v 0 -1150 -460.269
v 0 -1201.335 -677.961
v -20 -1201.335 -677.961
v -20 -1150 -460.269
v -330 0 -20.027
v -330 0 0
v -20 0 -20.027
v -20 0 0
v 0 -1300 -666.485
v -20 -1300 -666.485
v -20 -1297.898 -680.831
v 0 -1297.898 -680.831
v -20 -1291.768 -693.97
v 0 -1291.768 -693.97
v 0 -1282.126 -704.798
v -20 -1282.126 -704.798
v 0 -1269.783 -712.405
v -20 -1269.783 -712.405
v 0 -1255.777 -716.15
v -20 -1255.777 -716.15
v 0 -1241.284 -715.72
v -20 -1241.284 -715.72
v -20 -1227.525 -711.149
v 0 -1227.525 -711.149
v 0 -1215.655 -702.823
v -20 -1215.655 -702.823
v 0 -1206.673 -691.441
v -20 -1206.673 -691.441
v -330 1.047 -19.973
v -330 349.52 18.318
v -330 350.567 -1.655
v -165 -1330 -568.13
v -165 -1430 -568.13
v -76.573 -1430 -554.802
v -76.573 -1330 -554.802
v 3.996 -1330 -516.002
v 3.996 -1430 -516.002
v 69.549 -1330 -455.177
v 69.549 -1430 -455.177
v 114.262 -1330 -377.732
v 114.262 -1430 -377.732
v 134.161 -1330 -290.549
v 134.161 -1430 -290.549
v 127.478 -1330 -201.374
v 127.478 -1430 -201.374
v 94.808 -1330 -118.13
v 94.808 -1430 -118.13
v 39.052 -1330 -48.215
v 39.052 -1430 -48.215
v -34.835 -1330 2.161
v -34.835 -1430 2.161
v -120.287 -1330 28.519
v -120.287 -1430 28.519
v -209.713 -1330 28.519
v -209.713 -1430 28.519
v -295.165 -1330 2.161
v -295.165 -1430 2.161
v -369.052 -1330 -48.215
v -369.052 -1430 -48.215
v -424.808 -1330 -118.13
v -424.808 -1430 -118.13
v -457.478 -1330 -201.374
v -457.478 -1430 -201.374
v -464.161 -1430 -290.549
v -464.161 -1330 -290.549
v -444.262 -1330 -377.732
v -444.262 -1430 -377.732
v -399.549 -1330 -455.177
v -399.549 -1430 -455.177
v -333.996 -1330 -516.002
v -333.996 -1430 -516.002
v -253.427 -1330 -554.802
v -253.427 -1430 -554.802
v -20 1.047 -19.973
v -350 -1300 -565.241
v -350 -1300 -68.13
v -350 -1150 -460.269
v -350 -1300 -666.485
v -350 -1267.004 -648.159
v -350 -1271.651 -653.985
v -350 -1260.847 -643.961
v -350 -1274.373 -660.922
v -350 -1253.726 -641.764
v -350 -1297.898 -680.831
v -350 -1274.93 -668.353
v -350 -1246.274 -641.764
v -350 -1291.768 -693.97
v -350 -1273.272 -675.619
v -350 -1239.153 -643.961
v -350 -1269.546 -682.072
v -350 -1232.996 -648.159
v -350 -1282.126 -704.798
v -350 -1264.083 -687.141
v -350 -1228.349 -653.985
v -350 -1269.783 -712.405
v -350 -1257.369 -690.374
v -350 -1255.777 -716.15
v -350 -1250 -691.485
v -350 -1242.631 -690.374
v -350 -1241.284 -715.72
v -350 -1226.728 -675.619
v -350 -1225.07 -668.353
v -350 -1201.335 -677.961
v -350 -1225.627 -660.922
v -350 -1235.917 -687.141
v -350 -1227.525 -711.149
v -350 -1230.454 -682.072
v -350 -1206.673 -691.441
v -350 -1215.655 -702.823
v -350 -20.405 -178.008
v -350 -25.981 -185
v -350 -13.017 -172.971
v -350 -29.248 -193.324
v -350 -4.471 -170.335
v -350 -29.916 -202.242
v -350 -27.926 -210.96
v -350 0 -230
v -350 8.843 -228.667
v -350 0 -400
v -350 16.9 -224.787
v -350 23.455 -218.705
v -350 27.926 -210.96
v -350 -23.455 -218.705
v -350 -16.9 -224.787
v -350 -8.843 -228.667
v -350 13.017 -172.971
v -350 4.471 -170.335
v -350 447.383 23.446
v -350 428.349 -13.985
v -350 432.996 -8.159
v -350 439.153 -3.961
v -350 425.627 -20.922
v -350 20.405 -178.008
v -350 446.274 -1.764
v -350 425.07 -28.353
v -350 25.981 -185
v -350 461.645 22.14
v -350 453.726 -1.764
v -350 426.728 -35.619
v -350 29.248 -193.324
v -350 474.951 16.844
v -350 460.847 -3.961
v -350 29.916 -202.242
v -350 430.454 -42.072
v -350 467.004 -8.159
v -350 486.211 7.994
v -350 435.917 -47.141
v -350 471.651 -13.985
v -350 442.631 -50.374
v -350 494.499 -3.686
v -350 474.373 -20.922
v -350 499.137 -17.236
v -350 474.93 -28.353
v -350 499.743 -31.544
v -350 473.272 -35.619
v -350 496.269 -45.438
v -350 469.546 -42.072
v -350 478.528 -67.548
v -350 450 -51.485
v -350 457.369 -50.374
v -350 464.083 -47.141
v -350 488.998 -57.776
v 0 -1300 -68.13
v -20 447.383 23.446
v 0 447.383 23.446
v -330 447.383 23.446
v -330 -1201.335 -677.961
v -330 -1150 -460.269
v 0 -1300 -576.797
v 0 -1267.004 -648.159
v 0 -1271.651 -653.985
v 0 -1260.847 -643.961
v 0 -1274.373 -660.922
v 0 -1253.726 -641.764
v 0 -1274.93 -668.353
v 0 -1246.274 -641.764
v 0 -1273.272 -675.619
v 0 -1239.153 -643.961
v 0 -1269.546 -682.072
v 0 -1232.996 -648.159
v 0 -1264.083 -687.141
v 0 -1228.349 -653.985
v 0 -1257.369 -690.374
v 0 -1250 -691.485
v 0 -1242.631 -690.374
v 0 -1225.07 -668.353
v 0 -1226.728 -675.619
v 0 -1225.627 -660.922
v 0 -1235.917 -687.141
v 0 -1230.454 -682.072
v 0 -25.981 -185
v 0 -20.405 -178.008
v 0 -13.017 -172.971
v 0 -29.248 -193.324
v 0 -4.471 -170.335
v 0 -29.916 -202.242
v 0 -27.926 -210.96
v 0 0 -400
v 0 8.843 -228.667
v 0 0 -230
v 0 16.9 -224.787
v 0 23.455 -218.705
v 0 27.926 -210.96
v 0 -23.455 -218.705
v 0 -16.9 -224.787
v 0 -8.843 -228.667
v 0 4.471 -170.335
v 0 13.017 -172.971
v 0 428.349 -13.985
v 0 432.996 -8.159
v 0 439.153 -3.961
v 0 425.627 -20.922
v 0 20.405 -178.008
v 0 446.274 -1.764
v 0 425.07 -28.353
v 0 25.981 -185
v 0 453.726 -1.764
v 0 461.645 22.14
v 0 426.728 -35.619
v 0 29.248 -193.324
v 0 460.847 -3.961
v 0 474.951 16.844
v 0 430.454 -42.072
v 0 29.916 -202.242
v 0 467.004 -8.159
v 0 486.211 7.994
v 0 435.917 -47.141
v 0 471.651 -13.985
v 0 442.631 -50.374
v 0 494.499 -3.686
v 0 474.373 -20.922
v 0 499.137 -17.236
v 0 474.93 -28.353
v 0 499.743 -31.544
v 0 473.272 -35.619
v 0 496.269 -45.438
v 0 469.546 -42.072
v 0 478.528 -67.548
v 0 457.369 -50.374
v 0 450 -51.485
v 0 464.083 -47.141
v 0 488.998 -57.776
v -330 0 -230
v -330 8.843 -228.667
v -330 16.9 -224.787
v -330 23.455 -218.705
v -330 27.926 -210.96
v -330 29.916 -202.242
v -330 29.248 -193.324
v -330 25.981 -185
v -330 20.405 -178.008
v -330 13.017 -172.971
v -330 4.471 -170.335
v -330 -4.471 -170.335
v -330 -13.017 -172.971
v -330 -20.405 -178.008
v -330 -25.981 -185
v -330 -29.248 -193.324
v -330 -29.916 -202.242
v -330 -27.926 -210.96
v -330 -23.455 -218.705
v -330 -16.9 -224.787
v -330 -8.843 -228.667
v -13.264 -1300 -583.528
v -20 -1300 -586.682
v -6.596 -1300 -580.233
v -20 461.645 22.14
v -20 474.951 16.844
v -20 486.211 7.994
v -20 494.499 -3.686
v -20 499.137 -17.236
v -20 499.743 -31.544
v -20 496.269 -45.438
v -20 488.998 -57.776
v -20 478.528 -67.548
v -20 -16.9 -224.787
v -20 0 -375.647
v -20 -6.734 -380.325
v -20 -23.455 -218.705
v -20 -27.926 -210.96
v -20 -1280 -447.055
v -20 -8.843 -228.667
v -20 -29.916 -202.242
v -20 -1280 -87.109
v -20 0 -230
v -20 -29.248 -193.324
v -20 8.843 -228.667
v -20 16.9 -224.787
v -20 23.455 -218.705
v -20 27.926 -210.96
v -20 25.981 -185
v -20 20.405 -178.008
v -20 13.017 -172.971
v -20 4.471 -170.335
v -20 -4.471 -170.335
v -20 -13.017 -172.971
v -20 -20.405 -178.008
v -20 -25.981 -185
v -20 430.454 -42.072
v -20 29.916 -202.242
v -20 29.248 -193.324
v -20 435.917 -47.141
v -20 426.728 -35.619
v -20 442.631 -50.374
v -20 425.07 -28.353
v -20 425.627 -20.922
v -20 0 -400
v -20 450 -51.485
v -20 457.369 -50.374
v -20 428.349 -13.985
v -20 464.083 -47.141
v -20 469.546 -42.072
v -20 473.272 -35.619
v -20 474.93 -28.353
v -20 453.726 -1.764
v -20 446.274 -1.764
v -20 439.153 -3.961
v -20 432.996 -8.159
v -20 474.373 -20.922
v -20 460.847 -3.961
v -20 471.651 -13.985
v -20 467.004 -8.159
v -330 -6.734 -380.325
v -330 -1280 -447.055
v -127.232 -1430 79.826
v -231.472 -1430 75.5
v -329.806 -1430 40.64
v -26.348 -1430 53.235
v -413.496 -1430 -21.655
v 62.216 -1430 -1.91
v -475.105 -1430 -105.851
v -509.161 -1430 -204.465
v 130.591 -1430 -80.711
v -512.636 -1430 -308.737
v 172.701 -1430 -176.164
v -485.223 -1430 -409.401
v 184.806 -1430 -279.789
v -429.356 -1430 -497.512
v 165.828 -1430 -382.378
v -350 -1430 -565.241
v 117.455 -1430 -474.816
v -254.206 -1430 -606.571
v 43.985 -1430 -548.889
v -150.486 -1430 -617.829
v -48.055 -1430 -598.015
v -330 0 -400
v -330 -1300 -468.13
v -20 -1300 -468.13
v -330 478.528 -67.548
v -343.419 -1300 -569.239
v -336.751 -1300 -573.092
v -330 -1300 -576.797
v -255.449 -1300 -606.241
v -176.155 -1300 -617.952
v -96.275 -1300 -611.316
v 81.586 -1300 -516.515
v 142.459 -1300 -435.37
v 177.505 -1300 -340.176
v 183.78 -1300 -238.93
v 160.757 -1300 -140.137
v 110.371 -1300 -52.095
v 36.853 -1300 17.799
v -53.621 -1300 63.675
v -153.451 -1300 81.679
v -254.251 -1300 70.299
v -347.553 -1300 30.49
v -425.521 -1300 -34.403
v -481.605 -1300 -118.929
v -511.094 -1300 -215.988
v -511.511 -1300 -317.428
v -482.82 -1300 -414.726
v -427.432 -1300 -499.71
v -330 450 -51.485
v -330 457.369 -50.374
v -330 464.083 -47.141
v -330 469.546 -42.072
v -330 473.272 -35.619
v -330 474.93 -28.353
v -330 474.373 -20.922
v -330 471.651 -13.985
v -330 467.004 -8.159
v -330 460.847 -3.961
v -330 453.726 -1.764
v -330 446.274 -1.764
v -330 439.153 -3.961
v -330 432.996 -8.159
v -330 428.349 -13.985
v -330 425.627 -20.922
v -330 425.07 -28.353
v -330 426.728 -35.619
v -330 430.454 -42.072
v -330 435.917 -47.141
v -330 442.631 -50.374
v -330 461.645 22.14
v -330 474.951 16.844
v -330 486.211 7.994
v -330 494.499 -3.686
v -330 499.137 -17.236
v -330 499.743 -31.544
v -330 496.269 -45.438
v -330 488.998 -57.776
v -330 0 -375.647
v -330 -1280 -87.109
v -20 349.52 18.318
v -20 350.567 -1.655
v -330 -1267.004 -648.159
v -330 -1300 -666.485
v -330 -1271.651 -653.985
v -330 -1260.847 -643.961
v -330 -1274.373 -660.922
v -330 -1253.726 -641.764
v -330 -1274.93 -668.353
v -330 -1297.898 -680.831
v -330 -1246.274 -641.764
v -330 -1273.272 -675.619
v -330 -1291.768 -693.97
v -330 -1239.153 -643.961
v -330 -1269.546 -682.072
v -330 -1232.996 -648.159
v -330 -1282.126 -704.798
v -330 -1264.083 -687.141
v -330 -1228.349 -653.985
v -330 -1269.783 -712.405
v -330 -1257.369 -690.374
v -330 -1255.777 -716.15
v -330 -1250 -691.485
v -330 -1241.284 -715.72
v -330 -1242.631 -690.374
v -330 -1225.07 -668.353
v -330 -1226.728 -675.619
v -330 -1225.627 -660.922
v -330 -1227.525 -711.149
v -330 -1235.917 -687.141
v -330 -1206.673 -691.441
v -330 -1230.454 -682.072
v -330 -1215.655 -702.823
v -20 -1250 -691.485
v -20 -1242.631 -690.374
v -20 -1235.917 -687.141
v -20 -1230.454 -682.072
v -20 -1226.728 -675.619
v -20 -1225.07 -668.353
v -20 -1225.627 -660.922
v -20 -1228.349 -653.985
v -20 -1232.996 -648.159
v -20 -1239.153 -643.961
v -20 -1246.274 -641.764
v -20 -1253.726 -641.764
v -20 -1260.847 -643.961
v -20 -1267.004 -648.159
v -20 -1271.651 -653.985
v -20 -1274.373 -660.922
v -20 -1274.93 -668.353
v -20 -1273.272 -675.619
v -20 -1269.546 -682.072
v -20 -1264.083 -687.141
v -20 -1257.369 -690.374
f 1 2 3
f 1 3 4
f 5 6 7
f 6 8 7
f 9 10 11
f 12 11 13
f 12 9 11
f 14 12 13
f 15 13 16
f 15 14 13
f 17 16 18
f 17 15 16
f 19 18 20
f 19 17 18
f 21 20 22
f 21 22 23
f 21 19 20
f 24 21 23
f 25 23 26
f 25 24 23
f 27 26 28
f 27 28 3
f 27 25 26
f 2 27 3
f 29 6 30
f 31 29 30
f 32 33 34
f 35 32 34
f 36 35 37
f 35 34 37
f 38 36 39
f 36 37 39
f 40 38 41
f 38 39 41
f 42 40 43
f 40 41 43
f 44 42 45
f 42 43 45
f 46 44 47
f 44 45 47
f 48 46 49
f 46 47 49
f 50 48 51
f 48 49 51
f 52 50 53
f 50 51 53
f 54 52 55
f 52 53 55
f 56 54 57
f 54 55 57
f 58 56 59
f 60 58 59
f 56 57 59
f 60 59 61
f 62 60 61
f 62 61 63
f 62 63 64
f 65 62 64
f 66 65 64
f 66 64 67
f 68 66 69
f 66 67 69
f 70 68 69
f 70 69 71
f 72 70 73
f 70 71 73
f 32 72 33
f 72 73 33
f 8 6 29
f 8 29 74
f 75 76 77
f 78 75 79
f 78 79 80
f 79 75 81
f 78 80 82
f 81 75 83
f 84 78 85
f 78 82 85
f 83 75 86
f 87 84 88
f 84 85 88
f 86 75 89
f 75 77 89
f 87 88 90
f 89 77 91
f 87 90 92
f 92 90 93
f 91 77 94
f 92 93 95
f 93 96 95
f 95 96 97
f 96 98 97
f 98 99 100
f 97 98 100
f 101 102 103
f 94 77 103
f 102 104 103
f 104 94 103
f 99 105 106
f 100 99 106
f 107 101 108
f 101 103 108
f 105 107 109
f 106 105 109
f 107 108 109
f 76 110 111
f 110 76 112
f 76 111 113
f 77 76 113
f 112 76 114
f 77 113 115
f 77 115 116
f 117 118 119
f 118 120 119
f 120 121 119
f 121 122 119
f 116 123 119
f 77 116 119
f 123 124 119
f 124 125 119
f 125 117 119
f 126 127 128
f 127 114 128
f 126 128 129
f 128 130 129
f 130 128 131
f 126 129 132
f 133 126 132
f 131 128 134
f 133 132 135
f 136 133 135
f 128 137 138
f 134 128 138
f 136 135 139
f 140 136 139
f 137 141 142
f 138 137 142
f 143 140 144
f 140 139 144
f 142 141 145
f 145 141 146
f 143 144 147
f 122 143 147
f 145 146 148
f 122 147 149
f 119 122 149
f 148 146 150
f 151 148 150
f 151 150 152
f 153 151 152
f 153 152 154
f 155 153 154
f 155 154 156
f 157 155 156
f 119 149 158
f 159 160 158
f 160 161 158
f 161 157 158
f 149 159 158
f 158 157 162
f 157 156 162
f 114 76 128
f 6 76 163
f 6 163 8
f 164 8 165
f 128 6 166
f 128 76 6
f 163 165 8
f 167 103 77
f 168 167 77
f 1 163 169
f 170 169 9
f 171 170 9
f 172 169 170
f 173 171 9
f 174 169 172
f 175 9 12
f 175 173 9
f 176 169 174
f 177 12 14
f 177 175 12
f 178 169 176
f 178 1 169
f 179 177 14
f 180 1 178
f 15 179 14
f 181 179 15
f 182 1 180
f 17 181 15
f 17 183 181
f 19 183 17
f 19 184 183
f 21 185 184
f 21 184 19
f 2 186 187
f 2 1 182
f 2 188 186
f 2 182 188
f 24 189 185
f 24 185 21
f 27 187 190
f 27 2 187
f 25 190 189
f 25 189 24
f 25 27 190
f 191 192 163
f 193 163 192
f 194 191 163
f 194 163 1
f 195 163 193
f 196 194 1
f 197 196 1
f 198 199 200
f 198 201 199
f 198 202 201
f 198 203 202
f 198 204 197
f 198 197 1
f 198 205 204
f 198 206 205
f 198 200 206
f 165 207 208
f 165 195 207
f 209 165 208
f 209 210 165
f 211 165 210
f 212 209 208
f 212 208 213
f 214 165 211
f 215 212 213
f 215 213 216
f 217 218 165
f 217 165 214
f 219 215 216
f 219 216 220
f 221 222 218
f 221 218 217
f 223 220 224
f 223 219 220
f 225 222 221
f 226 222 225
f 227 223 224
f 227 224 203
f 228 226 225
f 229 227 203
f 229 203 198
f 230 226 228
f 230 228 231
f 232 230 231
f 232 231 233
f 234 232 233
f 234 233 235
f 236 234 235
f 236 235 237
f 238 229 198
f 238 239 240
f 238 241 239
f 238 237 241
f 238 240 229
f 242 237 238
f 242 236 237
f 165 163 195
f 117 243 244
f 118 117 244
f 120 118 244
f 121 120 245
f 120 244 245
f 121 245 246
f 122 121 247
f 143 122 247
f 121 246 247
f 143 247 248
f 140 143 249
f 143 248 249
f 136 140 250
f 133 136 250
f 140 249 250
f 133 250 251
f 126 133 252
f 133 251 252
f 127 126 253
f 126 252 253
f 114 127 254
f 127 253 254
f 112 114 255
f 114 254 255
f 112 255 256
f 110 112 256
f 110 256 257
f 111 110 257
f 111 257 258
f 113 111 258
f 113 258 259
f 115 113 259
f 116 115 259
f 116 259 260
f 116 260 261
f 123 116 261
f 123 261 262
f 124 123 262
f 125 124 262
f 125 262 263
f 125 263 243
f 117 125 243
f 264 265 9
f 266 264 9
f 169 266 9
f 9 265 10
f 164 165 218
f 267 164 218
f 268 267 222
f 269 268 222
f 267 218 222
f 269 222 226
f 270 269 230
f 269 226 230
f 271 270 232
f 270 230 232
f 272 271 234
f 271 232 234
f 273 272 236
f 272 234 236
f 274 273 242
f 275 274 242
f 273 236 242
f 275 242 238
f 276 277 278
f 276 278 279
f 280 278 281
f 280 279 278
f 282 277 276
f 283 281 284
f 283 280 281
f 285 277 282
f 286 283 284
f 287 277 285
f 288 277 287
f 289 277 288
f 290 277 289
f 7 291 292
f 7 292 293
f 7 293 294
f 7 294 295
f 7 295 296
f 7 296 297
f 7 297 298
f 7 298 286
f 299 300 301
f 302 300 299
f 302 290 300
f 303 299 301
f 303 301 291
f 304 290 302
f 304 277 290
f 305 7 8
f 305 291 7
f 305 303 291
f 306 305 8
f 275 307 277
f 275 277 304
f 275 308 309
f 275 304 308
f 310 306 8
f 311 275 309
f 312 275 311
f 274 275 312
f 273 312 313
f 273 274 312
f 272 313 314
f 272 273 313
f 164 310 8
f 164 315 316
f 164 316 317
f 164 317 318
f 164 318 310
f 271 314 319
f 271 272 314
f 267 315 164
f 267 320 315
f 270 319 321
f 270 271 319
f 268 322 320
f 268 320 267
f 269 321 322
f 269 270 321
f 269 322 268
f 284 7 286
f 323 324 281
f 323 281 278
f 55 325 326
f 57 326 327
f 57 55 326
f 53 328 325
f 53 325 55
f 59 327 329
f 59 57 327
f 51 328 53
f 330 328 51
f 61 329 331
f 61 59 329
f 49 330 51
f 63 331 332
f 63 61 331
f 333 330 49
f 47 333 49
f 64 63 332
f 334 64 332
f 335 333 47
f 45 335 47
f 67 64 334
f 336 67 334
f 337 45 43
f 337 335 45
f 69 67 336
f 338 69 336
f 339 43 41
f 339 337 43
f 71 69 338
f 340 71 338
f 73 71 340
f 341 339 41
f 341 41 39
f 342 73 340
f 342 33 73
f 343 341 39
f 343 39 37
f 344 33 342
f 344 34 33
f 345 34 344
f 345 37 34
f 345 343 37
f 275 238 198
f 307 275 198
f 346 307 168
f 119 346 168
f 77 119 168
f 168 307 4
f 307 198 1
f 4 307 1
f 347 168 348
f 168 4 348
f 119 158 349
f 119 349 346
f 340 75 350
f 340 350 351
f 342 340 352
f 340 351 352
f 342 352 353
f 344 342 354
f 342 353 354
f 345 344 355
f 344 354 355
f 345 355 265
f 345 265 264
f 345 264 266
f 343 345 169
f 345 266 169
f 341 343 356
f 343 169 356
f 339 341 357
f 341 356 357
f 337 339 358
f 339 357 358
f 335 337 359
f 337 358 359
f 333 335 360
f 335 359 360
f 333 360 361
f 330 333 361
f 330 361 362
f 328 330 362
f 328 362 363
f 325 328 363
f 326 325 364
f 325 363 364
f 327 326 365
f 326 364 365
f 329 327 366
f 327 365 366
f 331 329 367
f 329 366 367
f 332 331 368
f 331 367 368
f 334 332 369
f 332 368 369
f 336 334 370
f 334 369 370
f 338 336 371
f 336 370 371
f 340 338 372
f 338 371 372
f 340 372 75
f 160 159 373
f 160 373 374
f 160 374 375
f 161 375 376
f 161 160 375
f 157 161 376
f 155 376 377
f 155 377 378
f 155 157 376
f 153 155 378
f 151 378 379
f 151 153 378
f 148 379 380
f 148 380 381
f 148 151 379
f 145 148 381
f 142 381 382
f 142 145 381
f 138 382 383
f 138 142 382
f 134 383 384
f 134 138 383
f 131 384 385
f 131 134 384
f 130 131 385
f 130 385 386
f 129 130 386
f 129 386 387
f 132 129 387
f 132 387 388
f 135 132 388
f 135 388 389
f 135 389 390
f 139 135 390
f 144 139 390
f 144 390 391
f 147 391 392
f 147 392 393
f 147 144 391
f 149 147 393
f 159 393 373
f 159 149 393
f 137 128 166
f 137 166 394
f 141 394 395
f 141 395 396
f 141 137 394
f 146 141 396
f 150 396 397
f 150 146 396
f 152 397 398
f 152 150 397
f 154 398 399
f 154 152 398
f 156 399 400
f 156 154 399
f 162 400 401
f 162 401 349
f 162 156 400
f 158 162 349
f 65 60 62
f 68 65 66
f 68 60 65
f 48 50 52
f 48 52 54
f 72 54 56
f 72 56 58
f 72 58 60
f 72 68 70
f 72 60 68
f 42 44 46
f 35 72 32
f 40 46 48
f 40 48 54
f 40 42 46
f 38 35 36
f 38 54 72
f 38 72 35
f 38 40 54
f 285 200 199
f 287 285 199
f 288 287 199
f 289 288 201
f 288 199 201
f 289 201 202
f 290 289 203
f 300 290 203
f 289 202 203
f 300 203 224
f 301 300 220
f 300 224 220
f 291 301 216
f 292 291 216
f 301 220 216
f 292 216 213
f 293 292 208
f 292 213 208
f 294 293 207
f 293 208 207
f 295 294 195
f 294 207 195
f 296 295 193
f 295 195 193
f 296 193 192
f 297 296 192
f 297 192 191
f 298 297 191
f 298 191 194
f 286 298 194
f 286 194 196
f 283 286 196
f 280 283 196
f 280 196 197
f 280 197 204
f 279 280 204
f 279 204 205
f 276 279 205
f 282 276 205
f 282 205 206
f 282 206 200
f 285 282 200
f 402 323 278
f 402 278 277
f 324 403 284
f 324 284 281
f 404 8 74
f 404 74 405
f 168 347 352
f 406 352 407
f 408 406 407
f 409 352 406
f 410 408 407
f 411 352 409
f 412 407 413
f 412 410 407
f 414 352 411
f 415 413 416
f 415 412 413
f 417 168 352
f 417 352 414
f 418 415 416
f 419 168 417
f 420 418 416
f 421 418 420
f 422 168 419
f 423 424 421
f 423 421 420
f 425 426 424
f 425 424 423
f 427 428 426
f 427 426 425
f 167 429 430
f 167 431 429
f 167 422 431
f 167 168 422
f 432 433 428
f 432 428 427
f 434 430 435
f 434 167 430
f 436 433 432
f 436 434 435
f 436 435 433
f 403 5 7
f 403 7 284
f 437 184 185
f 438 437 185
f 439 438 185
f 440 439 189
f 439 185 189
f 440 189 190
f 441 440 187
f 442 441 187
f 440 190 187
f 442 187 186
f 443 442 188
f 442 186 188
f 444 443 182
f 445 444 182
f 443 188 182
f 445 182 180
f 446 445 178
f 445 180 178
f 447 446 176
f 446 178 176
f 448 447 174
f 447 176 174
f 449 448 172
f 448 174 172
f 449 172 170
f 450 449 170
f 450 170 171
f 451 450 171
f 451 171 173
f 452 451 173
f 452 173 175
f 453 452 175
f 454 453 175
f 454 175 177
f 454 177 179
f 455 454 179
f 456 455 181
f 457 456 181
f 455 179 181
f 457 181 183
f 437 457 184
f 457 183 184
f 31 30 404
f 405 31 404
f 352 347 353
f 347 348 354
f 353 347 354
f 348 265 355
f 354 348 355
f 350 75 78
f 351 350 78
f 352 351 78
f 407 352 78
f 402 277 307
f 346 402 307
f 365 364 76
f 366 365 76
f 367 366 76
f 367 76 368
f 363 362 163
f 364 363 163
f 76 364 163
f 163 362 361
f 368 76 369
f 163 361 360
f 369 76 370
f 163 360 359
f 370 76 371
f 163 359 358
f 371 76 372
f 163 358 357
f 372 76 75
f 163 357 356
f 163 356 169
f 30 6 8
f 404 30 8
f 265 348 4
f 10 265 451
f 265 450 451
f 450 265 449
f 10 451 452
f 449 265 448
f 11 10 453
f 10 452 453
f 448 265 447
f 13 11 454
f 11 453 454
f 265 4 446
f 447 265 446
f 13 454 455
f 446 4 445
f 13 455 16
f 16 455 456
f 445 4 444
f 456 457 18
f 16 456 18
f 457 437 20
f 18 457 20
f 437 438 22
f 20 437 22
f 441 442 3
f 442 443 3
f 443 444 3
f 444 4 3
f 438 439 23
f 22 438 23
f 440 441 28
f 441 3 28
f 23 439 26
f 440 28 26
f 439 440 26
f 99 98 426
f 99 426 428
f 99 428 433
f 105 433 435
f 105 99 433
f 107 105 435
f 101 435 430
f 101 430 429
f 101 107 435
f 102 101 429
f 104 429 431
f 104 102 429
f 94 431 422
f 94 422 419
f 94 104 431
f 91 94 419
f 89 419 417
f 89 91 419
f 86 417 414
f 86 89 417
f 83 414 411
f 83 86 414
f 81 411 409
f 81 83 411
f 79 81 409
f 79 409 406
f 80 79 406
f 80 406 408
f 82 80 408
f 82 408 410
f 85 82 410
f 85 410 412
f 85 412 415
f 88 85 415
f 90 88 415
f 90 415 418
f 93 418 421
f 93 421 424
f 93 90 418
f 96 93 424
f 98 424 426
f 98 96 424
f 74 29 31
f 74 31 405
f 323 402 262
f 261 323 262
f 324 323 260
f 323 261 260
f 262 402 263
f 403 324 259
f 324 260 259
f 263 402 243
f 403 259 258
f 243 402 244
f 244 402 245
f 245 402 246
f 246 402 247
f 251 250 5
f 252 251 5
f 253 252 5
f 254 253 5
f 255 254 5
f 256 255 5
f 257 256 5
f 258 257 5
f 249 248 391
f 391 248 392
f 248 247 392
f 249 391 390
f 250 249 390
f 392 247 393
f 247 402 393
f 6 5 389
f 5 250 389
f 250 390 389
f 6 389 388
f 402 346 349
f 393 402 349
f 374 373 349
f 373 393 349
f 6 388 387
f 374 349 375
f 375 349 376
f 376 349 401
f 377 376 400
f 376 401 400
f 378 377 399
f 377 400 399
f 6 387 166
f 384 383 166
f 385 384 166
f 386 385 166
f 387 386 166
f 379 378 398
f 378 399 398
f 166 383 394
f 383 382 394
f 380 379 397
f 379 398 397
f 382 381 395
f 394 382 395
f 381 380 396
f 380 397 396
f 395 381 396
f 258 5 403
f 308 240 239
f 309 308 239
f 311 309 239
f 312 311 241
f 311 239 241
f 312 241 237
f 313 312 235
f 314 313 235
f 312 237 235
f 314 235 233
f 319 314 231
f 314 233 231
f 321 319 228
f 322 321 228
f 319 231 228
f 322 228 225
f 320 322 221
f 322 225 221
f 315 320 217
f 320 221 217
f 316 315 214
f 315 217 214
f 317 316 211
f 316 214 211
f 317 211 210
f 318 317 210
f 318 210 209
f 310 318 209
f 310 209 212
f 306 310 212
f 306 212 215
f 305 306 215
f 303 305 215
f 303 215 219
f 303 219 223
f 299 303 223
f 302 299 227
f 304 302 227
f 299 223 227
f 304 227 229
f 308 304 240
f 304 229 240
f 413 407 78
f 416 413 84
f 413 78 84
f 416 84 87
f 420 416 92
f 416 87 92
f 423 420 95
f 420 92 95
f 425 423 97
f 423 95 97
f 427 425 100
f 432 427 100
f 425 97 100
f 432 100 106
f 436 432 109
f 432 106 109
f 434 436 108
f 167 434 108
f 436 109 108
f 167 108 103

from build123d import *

# Parameters (mm, degrees)
BOSS_EXTRUDE1_DEPTH = 20
BOSS_EXTRUDE2_DEPTH = 350
SHELL1_START        = -330
SHELL1_DEPTH        = 310
SKETCH3_R           = 25
CUT_EXTRUDE1_DEPTH  = 20
SKETCH4_W           = 310
SKETCH4_H           = 350
BOSS_EXTRUDE6_DEPTH = 20
SKETCH5_R           = 25
BOSS_EXTRUDE8_DEPTH = 20
SKETCH6_R           = 30
CUT_EXTRUDE2_DEPTH  = 1526.0740711
SKETCH8_R           = 350
BOSS_EXTRUDE9_DEPTH = 130
SKETCH9_R           = 300
CUT_EXTRUDE3_DEPTH  = 100


# Read off the part's stored shape, not the designer's step: Shell1
with BuildPart() as part:
    # Sketch1 → Boss-Extrude1 (new body)
    with BuildSketch(Plane(origin=(0, 0, 0), x_dir=(0, 0, -1), z_dir=(1, 0, 0))):
        with BuildLine():
            Line((0, 0), (-23.446360115, 447.383202188))
            ThreePointArc((-23.446360115, 447.383202188), (10.293696853, 497.305791674), (67.54794645, 478.527951321))
            Line((67.54794645, 478.527951321), (400, 0))
            Line((400, 0), (0, 0))
        make_face()
    boss_extrude1 = extrude(amount=-BOSS_EXTRUDE1_DEPTH)

    # Sketch2 → Boss-Extrude2 (add)
    with BuildSketch(Plane(origin=(0, 0, 0), x_dir=(0, 0, -1), z_dir=(1, 0, 0))):
        Polygon((0, 0), (400, 0), (468.130113068, -1300), (68.130113068, -1300), align=None)
    extrude(amount=-BOSS_EXTRUDE2_DEPTH)

    # Shell1 outline → Shell1 (cut)
    with BuildSketch(Plane.YZ.offset(SHELL1_START)):
        Polygon((0, -375.647075367), (0, -20.02744692), (-1280, -87.109404402), (-1280, -447.054510562), (-6.734029496, -380.325468612), align=None)
    shell1 = extrude(amount=SHELL1_DEPTH, mode=Mode.SUBTRACT)

    # Sketch3 → Cut-Extrude1 (cut)
    with BuildSketch(Plane(origin=(0, 0, 0), x_dir=(0, 0, -1), z_dir=(1, 0, 0))):
        with Locations((26.485116623, 450)):
            Circle(SKETCH3_R)
    cut_extrude1 = extrude(amount=-CUT_EXTRUDE1_DEPTH, mode=Mode.SUBTRACT)

    # Mirror1: Boss-Extrude1, Shell1, Cut-Extrude1 across plane
    add(boss_extrude1.mirror(Plane(origin=(-175, 0, 0), x_dir=(0, 0, 1), z_dir=(1, 0, 0))))
    add(shell1.mirror(Plane(origin=(-175, 0, 0), x_dir=(0, 0, 1), z_dir=(1, 0, 0))), mode=Mode.SUBTRACT)
    add(cut_extrude1.mirror(Plane(origin=(-175, 0, 0), x_dir=(0, 0, 1), z_dir=(1, 0, 0))), mode=Mode.SUBTRACT)

    # Sketch5 → Boss-Extrude8 (add)
    with BuildSketch(Plane(origin=(0, 0, 0), x_dir=(0, 0, -1), z_dir=(1, 0, 0))):
        with BuildLine():
            Line((468.130113068, -1300), (666.485116623, -1300))
            ThreePointArc((666.485116623, -1300), (716.150299283, -1255.77664533), (677.961042442, -1201.334785251))
            Line((677.961042442, -1201.334785251), (460.268946175, -1150))
            Line((460.268946175, -1150), (468.130113068, -1300))
        make_face()
        with Locations((666.485116623, -1250)):
            Circle(SKETCH5_R, mode=Mode.SUBTRACT)
    boss_extrude8 = extrude(amount=-BOSS_EXTRUDE8_DEPTH)

    # Mirror2: Boss-Extrude8 across plane
    add(boss_extrude8.mirror(Plane(origin=(-175, 0, 0), x_dir=(0, 0, 1), z_dir=(1, 0, 0))))

    # Sketch6 → Cut-Extrude2 (cut, through all)
    with BuildSketch(Plane(origin=(0, 0, 0), x_dir=(0, 0, -1), z_dir=(1, 0, 0))):
        with Locations((200, 0)):
            Circle(SKETCH6_R)
    extrude(amount=-CUT_EXTRUDE2_DEPTH, mode=Mode.SUBTRACT)

    # Sketch8 → Boss-Extrude9 (add)
    with BuildSketch(Plane(origin=(0, -1300, 0), x_dir=(-1, 0, 0), z_dir=(0, -1, 0))):
        with Locations(Location((165, 268.130113068, 0), (0, 0, 58.091017265))):
            Circle(SKETCH8_R)
    extrude(amount=BOSS_EXTRUDE9_DEPTH)

    # Sketch9 → Cut-Extrude3 (cut)
    with BuildSketch(Plane.XZ.offset(1430)):
        with Locations(Location((-165, -268.130113068, 0), (0, 0, 270))):
            Circle(SKETCH9_R)
    extrude(amount=-CUT_EXTRUDE3_DEPTH, mode=Mode.SUBTRACT)


with BuildPart() as body_2:
    # Sketch4 → Boss-Extrude6 (new body)
    with BuildSketch(Plane(origin=(0, 0, 0), x_dir=(1, 0, 0), z_dir=(0, -0.05233595624294052, 0.9986295347545742))):
        with Locations((-175, 175)):
            Rectangle(SKETCH4_W, SKETCH4_H)
    extrude(amount=-BOSS_EXTRUDE6_DEPTH)


solid = Compound([part.part, body_2.part])
